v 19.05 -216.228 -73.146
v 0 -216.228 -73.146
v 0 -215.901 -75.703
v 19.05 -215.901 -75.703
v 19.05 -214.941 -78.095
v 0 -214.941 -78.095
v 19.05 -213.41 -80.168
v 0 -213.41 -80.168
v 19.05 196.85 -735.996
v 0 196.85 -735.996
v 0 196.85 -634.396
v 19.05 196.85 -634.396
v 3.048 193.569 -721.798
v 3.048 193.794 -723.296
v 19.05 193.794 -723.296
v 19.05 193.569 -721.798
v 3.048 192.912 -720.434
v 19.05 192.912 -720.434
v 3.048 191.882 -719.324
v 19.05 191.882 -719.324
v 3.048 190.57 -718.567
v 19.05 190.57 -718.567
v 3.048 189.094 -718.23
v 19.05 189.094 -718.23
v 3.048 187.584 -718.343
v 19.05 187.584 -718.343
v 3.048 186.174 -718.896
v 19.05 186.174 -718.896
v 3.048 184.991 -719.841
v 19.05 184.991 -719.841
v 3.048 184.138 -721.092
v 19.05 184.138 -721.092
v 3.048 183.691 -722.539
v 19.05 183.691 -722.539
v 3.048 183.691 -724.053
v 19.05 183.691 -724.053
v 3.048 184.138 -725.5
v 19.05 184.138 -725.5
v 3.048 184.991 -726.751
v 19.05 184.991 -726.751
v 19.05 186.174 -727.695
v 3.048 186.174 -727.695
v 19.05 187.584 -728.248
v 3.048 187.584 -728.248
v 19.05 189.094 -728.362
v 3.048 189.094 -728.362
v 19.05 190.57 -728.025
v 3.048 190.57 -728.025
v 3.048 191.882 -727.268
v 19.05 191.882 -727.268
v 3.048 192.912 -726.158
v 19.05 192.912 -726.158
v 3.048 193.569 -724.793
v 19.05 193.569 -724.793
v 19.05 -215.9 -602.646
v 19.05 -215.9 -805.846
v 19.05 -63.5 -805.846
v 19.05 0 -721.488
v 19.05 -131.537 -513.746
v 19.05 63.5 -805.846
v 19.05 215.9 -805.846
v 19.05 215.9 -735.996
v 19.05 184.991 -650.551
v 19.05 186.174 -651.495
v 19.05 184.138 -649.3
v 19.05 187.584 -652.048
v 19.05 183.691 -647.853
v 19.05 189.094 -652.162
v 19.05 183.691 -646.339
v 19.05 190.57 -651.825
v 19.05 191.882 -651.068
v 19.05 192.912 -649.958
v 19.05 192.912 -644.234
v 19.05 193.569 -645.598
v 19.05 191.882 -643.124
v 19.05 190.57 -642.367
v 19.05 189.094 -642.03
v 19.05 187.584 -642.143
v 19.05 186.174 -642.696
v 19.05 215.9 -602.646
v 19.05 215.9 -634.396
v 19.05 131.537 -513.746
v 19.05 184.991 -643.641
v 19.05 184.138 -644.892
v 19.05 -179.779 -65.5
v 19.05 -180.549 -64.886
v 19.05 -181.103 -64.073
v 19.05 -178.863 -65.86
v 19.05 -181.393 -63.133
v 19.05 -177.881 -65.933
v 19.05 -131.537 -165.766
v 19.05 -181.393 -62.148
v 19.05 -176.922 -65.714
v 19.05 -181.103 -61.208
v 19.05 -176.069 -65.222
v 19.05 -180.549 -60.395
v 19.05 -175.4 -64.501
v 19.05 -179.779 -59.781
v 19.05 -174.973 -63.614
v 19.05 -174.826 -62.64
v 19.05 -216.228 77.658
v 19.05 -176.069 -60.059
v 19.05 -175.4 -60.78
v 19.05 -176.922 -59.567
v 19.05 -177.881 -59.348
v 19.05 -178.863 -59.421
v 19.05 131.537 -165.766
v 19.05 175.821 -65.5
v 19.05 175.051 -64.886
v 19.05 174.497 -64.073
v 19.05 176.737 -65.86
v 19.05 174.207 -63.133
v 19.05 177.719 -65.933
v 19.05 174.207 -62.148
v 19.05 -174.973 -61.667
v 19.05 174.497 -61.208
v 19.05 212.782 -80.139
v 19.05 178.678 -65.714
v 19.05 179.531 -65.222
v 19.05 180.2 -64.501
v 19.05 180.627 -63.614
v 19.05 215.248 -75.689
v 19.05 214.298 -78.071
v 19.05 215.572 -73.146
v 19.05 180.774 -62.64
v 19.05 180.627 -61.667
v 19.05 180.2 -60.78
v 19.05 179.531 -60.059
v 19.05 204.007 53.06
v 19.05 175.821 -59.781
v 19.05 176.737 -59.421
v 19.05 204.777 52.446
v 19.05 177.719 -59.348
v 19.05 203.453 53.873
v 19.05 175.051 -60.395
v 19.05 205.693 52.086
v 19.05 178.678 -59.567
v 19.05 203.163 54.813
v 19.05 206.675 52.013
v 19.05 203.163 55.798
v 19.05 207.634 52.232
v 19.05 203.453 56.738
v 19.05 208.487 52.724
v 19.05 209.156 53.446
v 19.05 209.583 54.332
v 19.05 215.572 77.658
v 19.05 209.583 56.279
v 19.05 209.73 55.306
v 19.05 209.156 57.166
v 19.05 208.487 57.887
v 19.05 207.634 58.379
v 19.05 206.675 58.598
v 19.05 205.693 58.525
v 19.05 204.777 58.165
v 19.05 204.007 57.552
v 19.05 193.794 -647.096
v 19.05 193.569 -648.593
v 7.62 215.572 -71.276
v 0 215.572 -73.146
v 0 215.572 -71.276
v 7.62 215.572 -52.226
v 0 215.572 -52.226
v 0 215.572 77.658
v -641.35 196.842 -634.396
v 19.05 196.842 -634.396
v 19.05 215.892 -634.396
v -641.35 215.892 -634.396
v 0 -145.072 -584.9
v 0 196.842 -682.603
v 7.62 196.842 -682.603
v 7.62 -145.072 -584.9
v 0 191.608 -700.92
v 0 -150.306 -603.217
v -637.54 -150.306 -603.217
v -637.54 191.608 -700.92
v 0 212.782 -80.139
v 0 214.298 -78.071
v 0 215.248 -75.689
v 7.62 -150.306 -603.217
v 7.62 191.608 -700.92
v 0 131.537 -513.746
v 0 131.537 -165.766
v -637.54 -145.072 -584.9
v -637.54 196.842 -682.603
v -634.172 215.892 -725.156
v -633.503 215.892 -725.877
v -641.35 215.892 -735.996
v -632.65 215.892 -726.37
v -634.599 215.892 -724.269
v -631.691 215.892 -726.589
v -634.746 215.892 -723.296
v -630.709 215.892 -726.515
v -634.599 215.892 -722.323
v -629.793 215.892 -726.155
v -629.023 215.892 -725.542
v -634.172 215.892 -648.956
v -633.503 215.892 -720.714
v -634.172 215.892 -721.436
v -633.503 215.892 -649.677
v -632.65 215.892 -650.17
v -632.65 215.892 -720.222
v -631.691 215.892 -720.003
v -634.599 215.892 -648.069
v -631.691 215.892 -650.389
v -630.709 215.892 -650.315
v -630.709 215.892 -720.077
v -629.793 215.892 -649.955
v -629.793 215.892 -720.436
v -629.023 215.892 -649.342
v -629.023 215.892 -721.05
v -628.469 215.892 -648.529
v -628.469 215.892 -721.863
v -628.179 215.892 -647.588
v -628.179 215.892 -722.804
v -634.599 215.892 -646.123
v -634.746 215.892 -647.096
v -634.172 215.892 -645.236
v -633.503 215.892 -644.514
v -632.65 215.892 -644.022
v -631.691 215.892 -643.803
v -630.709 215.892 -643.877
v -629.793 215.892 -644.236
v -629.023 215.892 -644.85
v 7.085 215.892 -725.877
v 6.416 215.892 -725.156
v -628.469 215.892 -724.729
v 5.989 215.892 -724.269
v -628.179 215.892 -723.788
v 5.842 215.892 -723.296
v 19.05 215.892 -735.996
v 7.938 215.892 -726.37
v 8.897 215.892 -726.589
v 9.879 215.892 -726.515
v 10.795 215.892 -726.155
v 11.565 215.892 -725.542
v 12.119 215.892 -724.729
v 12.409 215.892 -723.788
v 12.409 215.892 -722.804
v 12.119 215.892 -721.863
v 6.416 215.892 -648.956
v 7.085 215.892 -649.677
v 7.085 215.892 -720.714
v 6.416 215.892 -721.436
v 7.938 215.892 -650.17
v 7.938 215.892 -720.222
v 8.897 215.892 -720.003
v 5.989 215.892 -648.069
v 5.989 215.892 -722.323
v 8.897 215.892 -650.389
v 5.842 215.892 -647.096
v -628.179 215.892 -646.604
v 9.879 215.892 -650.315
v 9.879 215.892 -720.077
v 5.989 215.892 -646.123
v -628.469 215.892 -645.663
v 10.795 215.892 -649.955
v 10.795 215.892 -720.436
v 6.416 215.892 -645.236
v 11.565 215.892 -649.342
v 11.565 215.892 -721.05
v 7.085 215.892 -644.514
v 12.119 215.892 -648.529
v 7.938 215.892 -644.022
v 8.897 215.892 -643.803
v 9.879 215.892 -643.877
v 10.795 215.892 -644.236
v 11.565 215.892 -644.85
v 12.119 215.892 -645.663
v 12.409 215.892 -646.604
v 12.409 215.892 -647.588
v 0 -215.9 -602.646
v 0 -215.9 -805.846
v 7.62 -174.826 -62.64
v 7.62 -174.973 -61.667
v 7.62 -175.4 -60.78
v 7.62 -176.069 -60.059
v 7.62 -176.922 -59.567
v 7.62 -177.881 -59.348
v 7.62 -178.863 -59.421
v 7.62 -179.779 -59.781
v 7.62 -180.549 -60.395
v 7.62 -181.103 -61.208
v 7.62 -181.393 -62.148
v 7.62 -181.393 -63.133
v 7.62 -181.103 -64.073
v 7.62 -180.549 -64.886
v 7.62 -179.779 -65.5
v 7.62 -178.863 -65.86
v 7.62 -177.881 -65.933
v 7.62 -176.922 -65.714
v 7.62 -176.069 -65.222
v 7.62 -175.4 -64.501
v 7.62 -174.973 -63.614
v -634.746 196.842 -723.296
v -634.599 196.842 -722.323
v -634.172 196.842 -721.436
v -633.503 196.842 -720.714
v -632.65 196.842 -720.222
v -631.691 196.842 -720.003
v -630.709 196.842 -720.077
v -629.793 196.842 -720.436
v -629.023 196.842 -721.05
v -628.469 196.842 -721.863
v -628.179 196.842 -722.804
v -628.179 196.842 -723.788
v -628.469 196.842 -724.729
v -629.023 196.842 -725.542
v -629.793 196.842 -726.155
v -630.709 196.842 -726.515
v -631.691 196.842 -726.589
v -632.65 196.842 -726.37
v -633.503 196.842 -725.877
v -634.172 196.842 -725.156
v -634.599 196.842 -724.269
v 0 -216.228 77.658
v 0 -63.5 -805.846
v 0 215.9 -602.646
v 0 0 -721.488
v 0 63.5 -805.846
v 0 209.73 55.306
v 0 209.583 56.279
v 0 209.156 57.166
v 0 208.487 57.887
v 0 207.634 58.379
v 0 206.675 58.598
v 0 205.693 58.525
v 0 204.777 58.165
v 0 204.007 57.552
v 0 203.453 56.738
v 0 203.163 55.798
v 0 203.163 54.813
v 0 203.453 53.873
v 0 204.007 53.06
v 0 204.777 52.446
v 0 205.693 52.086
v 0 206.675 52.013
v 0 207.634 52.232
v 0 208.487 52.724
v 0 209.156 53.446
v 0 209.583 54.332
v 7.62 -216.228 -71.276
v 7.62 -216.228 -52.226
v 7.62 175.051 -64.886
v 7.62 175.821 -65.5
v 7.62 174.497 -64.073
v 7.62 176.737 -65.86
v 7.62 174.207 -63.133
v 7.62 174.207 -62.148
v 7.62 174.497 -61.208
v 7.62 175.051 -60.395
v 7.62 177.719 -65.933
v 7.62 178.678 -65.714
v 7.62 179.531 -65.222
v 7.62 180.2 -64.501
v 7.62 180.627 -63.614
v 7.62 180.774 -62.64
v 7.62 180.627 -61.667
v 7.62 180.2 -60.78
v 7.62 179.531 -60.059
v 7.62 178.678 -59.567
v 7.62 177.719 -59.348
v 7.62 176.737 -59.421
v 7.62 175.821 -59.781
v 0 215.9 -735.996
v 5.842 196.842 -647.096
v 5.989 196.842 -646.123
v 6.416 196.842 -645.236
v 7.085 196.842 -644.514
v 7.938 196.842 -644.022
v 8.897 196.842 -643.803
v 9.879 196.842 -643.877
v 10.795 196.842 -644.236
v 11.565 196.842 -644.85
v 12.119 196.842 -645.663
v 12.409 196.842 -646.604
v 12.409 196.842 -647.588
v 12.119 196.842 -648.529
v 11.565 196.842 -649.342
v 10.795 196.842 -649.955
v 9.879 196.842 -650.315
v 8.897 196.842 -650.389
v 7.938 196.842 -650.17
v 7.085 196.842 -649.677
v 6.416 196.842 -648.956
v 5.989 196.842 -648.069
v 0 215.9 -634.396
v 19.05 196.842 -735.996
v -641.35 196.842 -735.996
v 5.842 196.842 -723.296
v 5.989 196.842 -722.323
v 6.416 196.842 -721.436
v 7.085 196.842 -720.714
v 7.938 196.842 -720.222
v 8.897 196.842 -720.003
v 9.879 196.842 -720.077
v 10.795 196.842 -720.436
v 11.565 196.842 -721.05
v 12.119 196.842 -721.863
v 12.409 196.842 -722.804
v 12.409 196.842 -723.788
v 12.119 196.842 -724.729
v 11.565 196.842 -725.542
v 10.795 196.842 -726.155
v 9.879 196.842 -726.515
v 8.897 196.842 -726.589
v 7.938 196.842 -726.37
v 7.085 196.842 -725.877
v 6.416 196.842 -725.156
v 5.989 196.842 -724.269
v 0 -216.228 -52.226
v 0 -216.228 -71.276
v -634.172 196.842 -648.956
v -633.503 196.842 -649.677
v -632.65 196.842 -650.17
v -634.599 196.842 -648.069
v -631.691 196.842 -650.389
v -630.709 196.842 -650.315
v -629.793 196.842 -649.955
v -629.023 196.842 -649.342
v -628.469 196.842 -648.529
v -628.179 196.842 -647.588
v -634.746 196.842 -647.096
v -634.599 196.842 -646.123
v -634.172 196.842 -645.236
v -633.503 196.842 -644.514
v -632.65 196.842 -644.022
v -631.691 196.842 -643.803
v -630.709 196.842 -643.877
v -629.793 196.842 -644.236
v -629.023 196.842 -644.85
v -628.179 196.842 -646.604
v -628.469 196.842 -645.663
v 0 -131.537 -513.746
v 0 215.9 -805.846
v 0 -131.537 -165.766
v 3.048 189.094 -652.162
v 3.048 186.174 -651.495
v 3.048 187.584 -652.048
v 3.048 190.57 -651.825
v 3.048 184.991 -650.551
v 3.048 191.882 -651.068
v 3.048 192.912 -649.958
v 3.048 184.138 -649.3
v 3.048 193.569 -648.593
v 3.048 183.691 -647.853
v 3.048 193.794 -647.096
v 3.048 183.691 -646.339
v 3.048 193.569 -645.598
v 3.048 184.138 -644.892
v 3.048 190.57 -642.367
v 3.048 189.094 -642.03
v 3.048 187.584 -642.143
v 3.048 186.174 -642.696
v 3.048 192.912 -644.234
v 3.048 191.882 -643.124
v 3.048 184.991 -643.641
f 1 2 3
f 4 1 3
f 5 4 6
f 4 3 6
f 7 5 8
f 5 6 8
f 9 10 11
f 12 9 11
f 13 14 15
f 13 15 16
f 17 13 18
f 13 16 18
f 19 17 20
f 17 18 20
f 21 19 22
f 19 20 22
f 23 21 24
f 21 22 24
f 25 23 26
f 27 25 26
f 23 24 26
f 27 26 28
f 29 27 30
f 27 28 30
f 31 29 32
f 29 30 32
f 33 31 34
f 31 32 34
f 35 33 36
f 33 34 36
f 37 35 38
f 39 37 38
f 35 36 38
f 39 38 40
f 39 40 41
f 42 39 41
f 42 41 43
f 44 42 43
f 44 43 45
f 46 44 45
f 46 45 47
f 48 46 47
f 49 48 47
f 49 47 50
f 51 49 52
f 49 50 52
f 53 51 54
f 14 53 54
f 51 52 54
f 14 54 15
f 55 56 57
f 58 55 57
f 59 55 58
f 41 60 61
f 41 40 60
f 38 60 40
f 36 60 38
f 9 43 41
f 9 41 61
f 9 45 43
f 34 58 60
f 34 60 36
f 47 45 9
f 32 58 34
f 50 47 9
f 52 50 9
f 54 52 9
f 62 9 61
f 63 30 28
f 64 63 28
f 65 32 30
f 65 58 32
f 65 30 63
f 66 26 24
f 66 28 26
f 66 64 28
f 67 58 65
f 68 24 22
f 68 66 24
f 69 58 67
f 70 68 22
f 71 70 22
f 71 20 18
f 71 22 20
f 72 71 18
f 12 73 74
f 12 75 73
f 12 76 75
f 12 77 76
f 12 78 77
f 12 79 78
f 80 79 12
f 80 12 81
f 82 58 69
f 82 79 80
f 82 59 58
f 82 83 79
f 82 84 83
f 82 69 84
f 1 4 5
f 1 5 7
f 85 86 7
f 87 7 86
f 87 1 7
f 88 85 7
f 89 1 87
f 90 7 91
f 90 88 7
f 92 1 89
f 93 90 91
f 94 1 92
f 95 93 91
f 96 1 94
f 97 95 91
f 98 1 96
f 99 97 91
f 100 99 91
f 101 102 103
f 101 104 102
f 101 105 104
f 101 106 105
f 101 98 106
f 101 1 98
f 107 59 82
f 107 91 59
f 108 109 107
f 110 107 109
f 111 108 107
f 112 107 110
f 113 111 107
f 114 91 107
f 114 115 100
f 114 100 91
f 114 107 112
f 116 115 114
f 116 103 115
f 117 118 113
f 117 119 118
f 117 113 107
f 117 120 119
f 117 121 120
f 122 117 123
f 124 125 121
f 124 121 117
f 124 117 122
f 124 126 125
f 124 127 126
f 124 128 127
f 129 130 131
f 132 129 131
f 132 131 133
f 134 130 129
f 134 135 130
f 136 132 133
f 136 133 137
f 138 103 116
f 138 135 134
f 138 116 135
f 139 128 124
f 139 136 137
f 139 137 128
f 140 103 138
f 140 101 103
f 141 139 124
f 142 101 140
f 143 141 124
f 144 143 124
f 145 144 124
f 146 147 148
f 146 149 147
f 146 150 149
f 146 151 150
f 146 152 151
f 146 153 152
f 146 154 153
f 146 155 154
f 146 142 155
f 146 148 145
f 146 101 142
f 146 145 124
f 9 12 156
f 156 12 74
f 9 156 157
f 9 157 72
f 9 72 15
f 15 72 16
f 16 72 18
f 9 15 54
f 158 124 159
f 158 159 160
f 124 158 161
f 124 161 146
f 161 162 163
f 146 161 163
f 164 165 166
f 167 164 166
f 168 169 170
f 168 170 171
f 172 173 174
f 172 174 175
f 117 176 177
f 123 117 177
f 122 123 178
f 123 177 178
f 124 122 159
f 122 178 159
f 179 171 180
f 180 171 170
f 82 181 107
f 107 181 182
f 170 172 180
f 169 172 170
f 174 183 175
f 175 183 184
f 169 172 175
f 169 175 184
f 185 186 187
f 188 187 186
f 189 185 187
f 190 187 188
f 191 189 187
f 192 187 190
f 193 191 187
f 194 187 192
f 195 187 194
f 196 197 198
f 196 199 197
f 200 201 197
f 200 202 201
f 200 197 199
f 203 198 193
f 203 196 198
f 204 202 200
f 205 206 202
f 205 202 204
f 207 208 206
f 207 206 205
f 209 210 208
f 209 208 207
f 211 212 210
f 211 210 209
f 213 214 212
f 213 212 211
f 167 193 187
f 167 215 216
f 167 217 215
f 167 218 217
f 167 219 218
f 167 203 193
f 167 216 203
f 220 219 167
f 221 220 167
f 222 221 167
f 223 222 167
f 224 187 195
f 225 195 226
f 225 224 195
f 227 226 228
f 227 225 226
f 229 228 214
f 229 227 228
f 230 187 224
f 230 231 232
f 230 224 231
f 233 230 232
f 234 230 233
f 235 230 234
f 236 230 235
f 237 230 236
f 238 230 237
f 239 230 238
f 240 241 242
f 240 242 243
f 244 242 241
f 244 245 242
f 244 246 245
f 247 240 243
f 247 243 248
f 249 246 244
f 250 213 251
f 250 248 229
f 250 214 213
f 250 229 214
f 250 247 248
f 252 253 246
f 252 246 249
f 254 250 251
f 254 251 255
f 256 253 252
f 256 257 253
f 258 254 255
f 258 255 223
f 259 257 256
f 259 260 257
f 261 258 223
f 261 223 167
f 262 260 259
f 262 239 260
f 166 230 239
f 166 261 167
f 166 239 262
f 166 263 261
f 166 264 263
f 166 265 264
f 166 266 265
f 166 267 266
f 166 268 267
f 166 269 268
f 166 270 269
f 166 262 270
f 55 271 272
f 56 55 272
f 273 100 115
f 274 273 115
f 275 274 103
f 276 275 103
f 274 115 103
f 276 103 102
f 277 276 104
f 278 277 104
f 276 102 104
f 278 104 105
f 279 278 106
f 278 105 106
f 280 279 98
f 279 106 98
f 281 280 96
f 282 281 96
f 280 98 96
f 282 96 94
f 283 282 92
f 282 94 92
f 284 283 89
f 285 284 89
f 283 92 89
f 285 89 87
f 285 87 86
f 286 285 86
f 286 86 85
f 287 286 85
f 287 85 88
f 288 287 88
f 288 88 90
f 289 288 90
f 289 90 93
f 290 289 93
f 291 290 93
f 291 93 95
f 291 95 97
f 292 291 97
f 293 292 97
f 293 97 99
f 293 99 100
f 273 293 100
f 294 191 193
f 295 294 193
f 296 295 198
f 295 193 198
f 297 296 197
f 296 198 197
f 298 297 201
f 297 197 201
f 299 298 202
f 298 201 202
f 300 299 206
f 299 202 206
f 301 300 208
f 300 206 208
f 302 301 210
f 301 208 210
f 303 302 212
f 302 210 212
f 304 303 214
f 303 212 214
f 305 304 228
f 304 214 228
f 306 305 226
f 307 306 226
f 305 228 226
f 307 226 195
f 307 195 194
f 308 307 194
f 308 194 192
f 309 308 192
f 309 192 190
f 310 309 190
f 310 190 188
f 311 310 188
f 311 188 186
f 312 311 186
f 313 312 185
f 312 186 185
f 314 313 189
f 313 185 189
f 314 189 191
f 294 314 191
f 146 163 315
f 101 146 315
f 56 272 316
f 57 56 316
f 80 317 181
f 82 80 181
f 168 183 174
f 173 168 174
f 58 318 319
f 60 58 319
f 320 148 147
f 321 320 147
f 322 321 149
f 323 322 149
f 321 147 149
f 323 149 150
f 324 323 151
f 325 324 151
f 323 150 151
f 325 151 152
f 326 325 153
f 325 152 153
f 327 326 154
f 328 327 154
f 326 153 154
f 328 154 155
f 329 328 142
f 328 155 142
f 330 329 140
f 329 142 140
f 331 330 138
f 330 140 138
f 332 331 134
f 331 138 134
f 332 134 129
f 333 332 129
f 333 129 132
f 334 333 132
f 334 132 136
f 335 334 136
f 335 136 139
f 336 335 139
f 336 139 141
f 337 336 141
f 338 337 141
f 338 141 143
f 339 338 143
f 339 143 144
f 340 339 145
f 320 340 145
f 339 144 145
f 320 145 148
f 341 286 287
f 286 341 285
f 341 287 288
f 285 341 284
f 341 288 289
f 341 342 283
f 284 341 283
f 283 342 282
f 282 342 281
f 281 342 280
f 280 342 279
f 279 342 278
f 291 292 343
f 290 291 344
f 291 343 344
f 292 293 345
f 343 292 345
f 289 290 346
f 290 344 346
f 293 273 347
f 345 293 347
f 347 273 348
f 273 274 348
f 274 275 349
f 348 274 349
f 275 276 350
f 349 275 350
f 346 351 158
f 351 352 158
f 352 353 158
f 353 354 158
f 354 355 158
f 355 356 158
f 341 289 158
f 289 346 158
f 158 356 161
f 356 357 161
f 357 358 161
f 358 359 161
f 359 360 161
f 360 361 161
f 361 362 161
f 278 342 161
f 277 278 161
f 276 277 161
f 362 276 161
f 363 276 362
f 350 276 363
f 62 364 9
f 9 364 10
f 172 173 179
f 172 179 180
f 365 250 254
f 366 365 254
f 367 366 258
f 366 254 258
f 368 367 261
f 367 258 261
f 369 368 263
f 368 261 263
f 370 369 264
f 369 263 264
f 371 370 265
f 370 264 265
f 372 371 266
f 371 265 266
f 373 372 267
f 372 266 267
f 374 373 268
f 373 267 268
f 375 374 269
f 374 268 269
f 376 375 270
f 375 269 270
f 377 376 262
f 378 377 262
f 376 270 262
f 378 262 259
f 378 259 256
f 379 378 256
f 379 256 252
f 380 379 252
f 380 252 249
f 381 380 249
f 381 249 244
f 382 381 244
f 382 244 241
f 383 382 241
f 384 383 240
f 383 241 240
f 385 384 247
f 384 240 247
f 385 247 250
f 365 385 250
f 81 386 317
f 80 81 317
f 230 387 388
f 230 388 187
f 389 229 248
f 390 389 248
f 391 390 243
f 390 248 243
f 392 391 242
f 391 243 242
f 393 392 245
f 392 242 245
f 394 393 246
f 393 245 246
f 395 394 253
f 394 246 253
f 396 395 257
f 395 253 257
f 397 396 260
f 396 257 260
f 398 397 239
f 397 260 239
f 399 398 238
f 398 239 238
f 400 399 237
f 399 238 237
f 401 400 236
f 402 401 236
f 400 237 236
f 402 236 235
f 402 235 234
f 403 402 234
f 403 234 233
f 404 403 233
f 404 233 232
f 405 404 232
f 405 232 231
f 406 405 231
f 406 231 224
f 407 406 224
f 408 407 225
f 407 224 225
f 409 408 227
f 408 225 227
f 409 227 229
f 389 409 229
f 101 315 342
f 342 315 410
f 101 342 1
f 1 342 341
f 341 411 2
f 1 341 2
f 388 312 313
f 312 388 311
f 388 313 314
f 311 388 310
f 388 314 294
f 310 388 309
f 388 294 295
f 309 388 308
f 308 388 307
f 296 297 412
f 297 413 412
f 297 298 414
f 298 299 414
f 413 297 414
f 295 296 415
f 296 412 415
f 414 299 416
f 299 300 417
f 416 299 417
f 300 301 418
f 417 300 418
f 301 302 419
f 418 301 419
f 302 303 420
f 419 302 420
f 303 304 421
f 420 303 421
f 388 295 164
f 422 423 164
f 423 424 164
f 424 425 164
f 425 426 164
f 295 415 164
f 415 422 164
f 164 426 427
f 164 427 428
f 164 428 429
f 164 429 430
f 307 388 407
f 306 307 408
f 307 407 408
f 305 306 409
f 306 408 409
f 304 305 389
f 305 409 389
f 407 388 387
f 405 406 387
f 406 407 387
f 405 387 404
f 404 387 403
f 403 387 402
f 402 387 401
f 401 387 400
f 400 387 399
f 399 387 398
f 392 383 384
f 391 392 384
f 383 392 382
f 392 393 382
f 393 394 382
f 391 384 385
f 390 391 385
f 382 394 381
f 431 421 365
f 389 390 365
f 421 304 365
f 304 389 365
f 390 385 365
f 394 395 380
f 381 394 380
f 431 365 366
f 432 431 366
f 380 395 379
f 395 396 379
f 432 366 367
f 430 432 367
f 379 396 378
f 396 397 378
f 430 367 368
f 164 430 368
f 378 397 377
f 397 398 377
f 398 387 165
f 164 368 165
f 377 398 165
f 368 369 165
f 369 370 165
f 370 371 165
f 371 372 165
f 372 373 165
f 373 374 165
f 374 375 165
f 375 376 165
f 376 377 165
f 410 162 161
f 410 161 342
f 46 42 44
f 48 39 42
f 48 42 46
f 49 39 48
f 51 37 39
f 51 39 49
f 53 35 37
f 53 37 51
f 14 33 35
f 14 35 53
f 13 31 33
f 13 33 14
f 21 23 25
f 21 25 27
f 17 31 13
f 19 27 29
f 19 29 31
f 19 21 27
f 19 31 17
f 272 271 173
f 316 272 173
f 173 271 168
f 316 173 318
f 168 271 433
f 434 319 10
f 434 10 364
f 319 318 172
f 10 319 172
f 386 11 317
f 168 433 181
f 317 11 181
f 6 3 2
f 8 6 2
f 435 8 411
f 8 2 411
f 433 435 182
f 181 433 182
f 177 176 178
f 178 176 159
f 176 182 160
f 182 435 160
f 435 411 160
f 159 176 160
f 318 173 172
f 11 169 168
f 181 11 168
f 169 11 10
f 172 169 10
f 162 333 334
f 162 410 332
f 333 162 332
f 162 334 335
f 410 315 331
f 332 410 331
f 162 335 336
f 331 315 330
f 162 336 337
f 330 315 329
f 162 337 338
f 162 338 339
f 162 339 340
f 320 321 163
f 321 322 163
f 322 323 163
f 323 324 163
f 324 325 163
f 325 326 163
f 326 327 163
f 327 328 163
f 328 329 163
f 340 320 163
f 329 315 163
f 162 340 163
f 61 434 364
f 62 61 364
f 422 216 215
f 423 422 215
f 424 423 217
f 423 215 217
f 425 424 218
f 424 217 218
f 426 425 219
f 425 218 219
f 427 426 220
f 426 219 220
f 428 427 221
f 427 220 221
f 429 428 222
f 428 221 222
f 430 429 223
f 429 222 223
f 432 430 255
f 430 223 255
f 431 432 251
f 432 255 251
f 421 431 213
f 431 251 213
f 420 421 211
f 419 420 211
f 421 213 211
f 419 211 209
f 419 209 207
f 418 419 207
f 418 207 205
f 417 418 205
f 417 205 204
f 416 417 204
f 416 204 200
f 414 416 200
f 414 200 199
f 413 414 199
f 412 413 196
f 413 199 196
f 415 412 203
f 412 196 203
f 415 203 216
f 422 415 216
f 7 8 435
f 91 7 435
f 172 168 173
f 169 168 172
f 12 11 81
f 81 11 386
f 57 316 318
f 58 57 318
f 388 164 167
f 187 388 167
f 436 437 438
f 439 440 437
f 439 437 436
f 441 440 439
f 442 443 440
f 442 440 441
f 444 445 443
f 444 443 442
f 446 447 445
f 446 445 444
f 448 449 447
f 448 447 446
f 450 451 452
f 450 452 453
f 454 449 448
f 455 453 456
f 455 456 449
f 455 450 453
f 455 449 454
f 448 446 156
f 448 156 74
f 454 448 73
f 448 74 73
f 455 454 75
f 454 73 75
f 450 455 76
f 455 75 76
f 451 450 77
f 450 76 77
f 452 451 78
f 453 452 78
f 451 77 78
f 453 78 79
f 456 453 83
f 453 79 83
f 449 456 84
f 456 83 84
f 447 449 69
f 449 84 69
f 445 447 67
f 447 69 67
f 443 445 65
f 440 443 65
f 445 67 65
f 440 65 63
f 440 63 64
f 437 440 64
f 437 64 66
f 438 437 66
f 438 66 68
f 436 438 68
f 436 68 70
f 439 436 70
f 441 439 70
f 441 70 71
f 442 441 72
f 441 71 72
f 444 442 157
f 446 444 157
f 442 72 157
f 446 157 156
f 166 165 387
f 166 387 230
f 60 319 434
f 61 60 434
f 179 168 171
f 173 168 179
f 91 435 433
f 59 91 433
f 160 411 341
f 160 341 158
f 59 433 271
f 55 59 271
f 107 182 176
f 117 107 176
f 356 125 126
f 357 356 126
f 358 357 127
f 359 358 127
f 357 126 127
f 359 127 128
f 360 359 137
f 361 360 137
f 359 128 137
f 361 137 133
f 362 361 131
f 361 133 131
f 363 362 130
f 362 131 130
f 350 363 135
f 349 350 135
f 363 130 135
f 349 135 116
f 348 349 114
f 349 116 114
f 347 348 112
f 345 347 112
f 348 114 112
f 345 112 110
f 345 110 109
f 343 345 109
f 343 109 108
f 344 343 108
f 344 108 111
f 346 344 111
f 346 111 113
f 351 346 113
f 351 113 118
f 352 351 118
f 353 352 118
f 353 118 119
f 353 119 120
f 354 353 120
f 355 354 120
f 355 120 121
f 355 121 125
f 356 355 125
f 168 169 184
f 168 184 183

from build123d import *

# Parameters (mm, degrees)
F1_DEPTH  = 19.05
F2_W      = 19.05
F2_H      = 101.6
F3_DEPTH  = 660.4
F5_DEPTH  = 7.62
F7_DEPTH  = 7.62
F9_DEPTH  = 637.54
F10_R     = 3.302
F11_DEPTH = 19.05
F12_R     = 3.302
F13_DEPTH = 19.05
F14_R     = 5.08
F15_DEPTH = 16.002


with BuildPart() as f1:
    # F0 (on Right) → F1 (new body)
    with BuildSketch(Plane.YZ):
        with BuildLine():
            Line((215.5718380434, -73.1457177276), (215.5718380434, 77.6576289354))
            Line((215.5718380434, 77.6576289354), (-216.2281619566, 77.6576289354))
            Line((-216.2281619566, 77.6576289354), (-216.2281619566, -73.1457177276))
            ThreePointArc((-216.2281619566, -73.1457177276), (-215.4974164781, -76.9292027834), (-213.4102959787, -80.1684428397))
            Line((-213.4102959787, -80.1684428397), (-131.5366946364, -165.7658347835))
            Line((-131.5366946364, -165.7658347835), (-131.5366946364, -513.7458347835))
            Line((-131.5366946364, -513.7458347835), (-215.9, -602.6458347835))
            Line((-215.9, -602.6458347835), (-215.9, -805.8458347835))
            Line((-215.9, -805.8458347835), (-63.5, -805.8458347835))
            Line((-63.5, -805.8458347835), (0, -721.4879393578))
            Line((0, -721.4879393578), (63.5, -805.8458347835))
            Line((63.5, -805.8458347835), (215.9, -805.8458347835))
            Line((215.9, -805.8458347835), (215.9, -735.9958347835))
            Line((215.9, -735.9958347835), (196.85, -735.9958347835))
            Line((196.85, -735.9958347835), (196.85, -634.3958347835))
            Line((196.85, -634.3958347835), (215.9, -634.3958347835))
            Line((215.9, -634.3958347835), (215.9, -602.6458347835))
            Line((215.9, -602.6458347835), (131.5366946364, -513.7458347835))
            Line((131.5366946364, -513.7458347835), (131.5366946364, -165.7658347835))
            Line((131.5366946364, -165.7658347835), (212.7821361166, -80.1388791238))
            ThreePointArc((212.7821361166, -80.1388791238), (214.8486761904, -76.9102476834), (215.5718380434, -73.1457177276))
        make_face()
    extrude(amount=F1_DEPTH)

    # F4 (on face) → F5 (cut)
    with BuildSketch(Plane.YZ):
        Polygon((191.6083546797, -700.9198329832), (196.842453582, -682.6029907695), (-145.0719344069, -584.8998112603), (-150.3060333092, -603.216653474), align=None)
    extrude(amount=F5_DEPTH, mode=Mode.SUBTRACT)

    # F6 (on face) → F7 (cut)
    with BuildSketch(Plane.YZ):
        Polygon((-216.2281619566, -71.2764377356), (216.1737249309, -71.2764377356), (215.5718380434, -52.2264377356), (-216.2281619566, -52.2264377356), align=None)
    extrude(amount=F7_DEPTH, mode=Mode.SUBTRACT)

    # F12 (on face) → F13 (cut)
    with BuildSketch(Plane.YZ.offset(19.05)):
        with Locations((177.4718380434, -62.6404377356)):
            Circle(F12_R)
        with Locations((-178.1281619566, -62.6404377356)):
            Circle(F12_R)
        with Locations((206.4278380434, 55.3056289354)):
            Circle(F12_R)
    extrude(amount=-F13_DEPTH, mode=Mode.SUBTRACT)

    # F14 (on face) → F15 (cut)
    with BuildSketch(Plane.YZ.offset(19.05)):
        with Locations((188.714453582, -723.2958347835)):
            Circle(F14_R)
        with Locations((188.714453582, -647.0958347835)):
            Circle(F14_R)
    extrude(amount=-F15_DEPTH, mode=Mode.SUBTRACT)


with BuildPart() as f3:
    # F2 (on face) → F3 (new body)
    with BuildSketch(Plane.YZ.offset(19.05)):
        with Locations((206.367453582, -685.1958350637)):
            Rectangle(F2_W, F2_H)
    extrude(amount=-F3_DEPTH)

    # F10 (on face) → F11 (cut)
    with BuildSketch(Plane(origin=(0, 215.892453582, 0), x_dir=(-1, 0, 0), z_dir=(0, 1, 0))):
        with Locations((-9.144, -647.0958347835)):
            Circle(F10_R)
        with Locations((-9.144, -723.2958347835)):
            Circle(F10_R)
        with Locations((631.444, -647.0958347835)):
            Circle(F10_R)
        with Locations((631.444, -723.2958347835)):
            Circle(F10_R)
    extrude(amount=-F11_DEPTH, mode=Mode.SUBTRACT)


with BuildPart() as f9:
    # F8 (on face) → F9 (new body)
    with BuildSketch(Plane.YZ):
        Polygon((191.6083546797, -700.9198329832), (196.842453582, -682.6029907695), (-145.0719344069, -584.8998112603), (-150.3060333092, -603.216653474), align=None)
    extrude(amount=-F9_DEPTH)


solid = Compound([f1.part, f3.part, f9.part])
